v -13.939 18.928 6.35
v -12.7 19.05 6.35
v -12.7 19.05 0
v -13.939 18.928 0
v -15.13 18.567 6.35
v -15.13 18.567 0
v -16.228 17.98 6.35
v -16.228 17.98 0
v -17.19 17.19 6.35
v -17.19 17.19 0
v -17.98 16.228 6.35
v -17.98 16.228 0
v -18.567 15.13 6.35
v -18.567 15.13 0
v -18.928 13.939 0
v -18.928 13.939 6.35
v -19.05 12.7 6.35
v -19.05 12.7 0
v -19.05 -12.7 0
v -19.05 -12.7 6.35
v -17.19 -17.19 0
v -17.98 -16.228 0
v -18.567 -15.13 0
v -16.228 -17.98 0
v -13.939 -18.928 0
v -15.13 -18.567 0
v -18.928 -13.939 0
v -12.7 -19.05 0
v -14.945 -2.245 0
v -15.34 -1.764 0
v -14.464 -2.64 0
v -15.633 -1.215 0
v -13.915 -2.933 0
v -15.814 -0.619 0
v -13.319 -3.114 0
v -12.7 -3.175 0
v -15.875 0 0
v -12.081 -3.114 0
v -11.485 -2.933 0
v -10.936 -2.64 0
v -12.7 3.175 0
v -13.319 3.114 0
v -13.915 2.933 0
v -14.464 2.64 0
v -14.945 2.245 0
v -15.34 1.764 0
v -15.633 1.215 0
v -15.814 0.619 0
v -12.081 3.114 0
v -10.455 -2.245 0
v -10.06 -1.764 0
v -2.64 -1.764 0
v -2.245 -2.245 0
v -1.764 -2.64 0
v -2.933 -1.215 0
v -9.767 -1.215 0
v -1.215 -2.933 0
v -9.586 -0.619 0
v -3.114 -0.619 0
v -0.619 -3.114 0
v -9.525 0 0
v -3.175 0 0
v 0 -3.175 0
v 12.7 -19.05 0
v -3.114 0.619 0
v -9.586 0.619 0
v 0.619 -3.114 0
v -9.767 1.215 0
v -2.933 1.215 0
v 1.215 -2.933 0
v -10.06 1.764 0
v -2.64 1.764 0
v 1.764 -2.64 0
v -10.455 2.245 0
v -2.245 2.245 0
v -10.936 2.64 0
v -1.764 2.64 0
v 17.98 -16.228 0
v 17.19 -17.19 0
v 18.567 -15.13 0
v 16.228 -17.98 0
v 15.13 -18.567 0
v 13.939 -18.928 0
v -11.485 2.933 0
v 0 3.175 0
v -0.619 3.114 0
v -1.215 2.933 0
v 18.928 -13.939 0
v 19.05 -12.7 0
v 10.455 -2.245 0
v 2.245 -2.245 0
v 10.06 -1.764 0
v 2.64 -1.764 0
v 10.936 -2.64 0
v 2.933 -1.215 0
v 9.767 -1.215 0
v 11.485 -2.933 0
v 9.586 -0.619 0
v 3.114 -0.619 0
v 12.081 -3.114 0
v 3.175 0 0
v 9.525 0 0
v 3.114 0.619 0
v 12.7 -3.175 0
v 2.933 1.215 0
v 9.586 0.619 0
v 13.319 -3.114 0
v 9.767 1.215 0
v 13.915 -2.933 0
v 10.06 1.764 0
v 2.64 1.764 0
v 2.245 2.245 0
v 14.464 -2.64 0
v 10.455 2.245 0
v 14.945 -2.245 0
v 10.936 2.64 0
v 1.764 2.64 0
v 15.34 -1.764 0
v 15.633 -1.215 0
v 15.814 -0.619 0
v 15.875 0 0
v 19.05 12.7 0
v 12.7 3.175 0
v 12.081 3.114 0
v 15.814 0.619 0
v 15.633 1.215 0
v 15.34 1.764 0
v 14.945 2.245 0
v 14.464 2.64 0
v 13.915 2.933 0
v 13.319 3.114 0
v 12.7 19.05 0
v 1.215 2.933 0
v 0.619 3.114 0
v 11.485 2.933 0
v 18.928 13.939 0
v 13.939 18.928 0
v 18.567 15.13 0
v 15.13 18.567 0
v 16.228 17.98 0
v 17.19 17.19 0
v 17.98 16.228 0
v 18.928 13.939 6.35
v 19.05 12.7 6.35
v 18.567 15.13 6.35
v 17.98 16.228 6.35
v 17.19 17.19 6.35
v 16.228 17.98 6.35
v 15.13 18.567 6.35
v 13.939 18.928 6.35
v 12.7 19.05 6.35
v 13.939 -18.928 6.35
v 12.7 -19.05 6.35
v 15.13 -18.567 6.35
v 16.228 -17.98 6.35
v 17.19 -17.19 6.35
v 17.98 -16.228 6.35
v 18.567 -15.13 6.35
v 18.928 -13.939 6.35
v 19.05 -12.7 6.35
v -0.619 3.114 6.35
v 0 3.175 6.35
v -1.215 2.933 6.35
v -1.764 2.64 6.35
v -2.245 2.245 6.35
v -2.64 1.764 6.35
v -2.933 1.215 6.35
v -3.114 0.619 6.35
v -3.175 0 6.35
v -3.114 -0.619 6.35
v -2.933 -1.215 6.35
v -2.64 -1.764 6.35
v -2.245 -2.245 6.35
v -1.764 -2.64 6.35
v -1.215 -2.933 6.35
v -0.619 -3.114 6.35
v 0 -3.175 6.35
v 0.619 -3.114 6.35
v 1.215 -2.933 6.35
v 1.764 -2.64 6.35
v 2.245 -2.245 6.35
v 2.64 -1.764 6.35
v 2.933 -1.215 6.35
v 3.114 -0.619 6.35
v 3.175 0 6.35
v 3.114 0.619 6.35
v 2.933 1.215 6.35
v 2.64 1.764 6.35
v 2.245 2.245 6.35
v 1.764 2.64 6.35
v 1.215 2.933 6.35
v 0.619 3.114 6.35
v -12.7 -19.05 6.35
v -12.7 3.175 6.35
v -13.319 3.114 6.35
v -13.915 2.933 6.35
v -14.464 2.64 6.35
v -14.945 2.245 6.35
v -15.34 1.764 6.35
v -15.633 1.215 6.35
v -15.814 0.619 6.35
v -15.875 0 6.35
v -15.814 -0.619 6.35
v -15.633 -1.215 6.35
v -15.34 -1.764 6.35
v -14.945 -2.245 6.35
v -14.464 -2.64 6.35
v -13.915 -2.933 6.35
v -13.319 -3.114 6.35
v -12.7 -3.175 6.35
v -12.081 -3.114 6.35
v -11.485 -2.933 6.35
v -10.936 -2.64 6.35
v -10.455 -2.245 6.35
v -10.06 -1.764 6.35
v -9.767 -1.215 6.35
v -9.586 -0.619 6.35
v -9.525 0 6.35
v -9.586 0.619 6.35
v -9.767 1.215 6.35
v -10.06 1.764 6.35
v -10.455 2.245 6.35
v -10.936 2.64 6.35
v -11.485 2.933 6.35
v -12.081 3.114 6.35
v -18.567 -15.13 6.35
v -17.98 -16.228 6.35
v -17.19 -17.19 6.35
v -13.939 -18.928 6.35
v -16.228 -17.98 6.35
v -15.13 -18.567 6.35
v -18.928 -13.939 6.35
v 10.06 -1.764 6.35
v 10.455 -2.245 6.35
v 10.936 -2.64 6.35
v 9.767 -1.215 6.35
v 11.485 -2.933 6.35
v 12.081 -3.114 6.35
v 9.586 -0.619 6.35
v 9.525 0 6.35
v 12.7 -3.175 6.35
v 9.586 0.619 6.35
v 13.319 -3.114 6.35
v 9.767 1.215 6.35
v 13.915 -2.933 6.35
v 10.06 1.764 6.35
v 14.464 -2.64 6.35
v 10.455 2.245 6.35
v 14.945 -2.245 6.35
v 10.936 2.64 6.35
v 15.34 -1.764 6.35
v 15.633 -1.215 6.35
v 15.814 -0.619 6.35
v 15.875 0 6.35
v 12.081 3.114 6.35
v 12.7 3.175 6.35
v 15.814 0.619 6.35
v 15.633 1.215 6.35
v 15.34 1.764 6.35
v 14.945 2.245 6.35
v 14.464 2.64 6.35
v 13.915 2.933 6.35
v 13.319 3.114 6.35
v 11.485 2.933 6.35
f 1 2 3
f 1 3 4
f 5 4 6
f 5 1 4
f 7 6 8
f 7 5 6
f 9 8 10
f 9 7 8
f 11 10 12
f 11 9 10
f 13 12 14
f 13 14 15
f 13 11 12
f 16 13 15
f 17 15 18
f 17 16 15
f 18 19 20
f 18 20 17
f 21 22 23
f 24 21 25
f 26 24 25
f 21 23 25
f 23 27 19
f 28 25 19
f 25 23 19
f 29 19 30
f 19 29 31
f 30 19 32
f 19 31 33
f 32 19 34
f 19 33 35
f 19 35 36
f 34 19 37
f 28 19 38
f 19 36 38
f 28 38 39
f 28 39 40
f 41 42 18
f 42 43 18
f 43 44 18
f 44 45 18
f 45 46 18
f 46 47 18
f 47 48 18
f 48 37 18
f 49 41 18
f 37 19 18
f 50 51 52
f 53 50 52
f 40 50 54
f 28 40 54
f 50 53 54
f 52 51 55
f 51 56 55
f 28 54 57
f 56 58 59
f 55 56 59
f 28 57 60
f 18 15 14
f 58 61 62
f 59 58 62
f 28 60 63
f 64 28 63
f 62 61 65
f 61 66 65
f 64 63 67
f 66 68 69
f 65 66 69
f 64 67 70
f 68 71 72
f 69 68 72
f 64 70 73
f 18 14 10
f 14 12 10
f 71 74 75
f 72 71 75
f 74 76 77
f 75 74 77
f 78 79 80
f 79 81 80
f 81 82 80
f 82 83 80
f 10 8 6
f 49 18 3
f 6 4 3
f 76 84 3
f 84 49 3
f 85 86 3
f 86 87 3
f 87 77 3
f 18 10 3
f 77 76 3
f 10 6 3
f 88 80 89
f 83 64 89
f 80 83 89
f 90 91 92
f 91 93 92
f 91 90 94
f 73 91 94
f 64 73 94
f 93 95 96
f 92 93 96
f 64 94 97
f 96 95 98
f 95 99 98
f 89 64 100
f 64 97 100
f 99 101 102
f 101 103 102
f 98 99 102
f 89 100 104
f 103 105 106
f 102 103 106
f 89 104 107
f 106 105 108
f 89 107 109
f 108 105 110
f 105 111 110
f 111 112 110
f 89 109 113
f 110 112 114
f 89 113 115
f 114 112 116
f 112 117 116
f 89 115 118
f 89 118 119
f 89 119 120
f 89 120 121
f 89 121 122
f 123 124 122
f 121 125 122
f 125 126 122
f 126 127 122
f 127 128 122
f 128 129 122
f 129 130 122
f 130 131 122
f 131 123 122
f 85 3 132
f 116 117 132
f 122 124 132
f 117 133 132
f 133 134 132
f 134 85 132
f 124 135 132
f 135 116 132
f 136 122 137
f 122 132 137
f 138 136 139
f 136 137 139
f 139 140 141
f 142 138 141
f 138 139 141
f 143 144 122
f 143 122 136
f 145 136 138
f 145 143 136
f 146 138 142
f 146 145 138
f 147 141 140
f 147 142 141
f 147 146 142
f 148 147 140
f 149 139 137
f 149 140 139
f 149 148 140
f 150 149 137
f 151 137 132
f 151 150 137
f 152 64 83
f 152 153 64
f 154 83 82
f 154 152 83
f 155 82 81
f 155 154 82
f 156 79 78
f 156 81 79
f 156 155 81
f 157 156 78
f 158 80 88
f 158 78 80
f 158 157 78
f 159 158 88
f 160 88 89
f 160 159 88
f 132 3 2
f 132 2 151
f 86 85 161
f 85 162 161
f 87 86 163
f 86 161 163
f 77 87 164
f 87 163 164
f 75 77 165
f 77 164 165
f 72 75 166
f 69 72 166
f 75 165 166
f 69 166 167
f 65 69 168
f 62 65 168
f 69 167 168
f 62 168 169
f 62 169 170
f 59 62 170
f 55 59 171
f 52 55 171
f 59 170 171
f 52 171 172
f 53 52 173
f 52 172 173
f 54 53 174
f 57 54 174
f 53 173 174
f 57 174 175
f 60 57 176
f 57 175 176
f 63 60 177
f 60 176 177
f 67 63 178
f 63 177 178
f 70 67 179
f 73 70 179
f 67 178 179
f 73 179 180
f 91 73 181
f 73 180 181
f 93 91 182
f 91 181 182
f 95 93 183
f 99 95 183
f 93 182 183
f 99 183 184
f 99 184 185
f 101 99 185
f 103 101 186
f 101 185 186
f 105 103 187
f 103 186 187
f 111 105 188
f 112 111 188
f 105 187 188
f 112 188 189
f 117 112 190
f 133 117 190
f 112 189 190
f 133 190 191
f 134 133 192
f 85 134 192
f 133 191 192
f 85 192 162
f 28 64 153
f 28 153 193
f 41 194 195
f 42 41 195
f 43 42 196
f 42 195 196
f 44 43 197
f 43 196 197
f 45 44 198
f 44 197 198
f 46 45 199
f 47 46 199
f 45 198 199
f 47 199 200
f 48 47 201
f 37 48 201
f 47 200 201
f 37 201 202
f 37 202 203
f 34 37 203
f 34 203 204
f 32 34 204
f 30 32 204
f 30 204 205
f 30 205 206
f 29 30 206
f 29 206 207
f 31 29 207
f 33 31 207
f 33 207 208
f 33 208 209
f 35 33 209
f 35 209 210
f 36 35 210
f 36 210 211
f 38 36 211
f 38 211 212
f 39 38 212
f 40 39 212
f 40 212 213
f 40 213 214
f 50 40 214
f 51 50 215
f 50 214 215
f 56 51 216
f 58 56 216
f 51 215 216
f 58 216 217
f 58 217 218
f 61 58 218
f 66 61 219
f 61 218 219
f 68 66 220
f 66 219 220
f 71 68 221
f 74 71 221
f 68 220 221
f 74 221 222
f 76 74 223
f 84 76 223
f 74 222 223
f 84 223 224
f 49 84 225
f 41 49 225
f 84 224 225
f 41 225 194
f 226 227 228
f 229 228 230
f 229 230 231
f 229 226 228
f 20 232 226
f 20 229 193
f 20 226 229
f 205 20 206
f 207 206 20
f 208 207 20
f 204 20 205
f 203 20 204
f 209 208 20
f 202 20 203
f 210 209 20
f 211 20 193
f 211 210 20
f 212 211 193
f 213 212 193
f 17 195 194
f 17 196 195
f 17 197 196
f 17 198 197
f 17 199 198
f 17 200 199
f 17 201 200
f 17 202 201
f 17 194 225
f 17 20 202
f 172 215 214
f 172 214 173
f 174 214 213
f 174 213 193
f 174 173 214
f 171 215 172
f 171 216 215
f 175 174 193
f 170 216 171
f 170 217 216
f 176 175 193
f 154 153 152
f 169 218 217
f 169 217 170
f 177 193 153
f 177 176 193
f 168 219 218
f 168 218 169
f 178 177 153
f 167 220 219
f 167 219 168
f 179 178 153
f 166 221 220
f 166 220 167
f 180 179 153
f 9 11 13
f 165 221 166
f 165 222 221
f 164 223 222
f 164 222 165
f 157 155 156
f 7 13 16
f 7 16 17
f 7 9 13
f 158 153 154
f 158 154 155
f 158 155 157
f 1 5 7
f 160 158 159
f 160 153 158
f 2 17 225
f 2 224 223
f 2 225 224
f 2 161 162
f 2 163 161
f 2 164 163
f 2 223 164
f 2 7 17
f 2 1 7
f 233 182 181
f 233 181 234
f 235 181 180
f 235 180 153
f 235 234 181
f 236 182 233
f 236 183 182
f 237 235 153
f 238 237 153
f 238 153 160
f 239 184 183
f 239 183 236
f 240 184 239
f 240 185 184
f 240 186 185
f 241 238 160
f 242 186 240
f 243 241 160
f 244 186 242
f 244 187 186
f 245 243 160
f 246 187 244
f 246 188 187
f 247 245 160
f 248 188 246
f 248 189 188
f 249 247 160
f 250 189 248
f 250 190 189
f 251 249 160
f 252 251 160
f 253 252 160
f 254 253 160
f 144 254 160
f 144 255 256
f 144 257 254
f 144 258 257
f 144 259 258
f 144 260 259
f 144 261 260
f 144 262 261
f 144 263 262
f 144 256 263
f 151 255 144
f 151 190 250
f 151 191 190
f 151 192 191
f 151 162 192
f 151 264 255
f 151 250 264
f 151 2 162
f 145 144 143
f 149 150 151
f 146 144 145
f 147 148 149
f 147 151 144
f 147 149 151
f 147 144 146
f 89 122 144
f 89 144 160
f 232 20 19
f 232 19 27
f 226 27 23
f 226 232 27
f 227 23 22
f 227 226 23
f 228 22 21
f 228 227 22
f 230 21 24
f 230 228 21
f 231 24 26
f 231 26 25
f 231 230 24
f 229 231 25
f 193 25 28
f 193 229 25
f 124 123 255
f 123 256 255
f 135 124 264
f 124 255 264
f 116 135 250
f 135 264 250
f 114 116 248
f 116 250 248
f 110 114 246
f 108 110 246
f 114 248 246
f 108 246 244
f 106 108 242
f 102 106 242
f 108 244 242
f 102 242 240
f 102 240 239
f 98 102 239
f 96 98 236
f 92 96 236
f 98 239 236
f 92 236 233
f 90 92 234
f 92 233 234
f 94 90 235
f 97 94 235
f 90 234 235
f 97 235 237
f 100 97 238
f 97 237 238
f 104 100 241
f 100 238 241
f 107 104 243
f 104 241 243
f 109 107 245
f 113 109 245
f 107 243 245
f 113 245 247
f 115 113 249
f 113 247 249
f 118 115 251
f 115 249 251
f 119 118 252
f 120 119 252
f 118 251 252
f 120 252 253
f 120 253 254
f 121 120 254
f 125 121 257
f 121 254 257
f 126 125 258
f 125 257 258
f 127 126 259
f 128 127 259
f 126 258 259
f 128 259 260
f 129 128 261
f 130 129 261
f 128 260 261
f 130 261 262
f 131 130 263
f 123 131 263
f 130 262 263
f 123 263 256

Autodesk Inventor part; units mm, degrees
ref_plane "YZ Plane" through (0, 0, 0) normal (1, 0, 0) x (0, 1, 0)
ref_plane "XZ Plane" through (0, 0, 0) normal (0, 1, 0) x (-1, 0, 0)
ref_plane "XY Plane" through (0, 0, 0) normal (0, 0, 1) x (1, 0, 0)
sketch "Sketch1" plane through (0, 0, 0) normal (0, 0, 1) x (1, 0, 0)
  line L0 (-19.05, 19.05) -> (19.05, 19.05)
  line L1 (19.05, 19.05) -> (19.05, -19.05)
  line L2 (19.05, -19.05) -> (-19.05, -19.05)
  line L3 (-19.05, -19.05) -> (-19.05, 19.05)
  line L4 (0, 19.05) -> (0, -19.05) construction
  line L5 (-19.05, 0) -> (19.05, 0) construction
  point P0 (0, 0)
  point P1 (0, 0)
  dimension "d0" = 38.1
  dimension "d1" = 38.1
extrude "Extrusion1" add sketch "Sketch1" along normal blind 6.35
sketch "Sketch2" plane through (0, 0, 0) normal (0, 0, 1) x (1, 0, 0)
  point P0 (0, 0)
  point P1 (0, 0)
  point P2 (-12.7, 0)
  point P3 (12.7, 0)
  dimension "d4" = 12.7
  dimension "d5" = 12.7
hole "Hole1" at (0, 0, 0) at (-12.7, 0, 0) at (12.7, 0, 0) direction (0, 0, 1) diameter 6.35 end through all
fillet "Fillet1" radius 6.35 4 edges at (19.05, -19.05, 3.175) (19.05, 19.05, 3.175) (-19.05, 19.05, 3.175) (-19.05, -19.05, 3.175)
properties part number "J005646"
